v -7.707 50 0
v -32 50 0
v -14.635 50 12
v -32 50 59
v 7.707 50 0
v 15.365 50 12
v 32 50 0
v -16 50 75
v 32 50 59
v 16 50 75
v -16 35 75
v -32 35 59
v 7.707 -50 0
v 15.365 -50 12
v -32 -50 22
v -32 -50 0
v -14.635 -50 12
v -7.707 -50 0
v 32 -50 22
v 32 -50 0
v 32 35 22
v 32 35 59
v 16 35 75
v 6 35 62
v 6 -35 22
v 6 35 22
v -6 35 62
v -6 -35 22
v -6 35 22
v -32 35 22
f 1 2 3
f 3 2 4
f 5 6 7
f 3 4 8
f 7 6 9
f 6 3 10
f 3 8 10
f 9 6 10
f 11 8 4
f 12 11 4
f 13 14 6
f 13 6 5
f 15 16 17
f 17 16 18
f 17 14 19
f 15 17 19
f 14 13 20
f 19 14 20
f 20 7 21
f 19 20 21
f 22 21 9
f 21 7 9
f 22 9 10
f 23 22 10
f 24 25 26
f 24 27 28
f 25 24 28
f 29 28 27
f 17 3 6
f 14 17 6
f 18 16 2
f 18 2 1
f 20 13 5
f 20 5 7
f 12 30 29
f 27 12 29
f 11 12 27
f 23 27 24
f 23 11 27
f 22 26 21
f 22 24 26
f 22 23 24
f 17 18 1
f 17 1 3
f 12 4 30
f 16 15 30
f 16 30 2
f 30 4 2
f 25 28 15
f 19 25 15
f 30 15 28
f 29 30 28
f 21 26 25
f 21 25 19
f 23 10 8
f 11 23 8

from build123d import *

# Parameters (mm, degrees)
SKETCH_W        = 64
SKETCH_H        = 100
PAD_DEPTH       = 22
PAD001_DEPTH    = 15
POCKET_DEPTH    = 100.001
SKETCH003_W     = 12
SKETCH003_H     = 70
PAD002_DEPTH    = 40
POCKET001_DEPTH = 12


with BuildPart() as part:
    # Sketch → Pad (new body)
    with BuildSketch(Plane.XY):
        Rectangle(SKETCH_W, SKETCH_H)
    extrude(amount=PAD_DEPTH)

    # Sketch001 (on Face1 of Pad) → Pad001 (join)
    with BuildSketch(Plane(origin=(0, 50, 0), x_dir=(-1, 0, 0), z_dir=(0, 1, 0))):
        Polygon((-32, 22), (-32, 59), (-16, 75), (16, 75), (32, 59), (32, 22), align=None)
    extrude(amount=-PAD001_DEPTH)

    # Sketch002 (on Face6 of Pad001) → Pocket (cut, through all)
    with BuildSketch(Plane.XZ.offset(50)):
        Polygon((-7.707092, 0), (-14.635295, 12), (15.364705, 12), (7.707092, 0), align=None)
    extrude(amount=-POCKET_DEPTH, mode=Mode.SUBTRACT)

    # Sketch003 (on Face12 of Pocket) → Pad002 (join)
    with BuildSketch(Plane.XY.offset(22)):
        Rectangle(SKETCH003_W, SKETCH003_H)
    extrude(amount=PAD002_DEPTH)

    # Sketch004 (on Face20 of Pad002) → Pocket001 (cut)
    with BuildSketch(Plane(origin=(-6, 0, 0), x_dir=(0, -1, 0), z_dir=(-1, 0, 0))):
        Polygon((-35, 62), (35, 22), (35, 62), align=None)
    extrude(amount=-POCKET001_DEPTH, mode=Mode.SUBTRACT)


solid = part.part
